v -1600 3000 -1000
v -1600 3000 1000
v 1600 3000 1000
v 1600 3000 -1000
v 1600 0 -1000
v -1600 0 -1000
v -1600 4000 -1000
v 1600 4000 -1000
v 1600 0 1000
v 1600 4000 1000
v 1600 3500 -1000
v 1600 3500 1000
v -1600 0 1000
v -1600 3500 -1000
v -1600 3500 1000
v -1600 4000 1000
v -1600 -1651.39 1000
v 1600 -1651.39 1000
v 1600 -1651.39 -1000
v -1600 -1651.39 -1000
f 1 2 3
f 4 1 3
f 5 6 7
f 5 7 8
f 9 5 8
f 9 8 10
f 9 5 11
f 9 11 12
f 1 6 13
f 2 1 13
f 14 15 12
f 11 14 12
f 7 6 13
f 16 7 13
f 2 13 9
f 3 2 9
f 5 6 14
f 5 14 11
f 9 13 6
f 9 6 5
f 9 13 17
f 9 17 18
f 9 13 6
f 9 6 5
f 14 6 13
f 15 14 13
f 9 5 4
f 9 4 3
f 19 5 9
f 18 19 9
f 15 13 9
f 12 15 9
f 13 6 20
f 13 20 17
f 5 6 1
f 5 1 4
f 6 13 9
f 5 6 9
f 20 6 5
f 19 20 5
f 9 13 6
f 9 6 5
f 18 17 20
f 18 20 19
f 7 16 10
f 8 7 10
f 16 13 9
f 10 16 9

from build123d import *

# Parameters (mm, degrees)
F0_W     = 3200
F0_H     = 2000
F1_DEPTH = 1651.39
F2_DEPTH = 3000
F3_DEPTH = 3500
F4_DEPTH = 4000


with BuildPart() as f1:
    # F0 (on Front) → F1 (new body)
    with BuildSketch(Plane.XZ):
        Rectangle(F0_W, F0_H)
    extrude(amount=F1_DEPTH)


with BuildPart() as f2:
    # F0 (on Front) → F2 (new body)
    with BuildSketch(Plane.XZ):
        Rectangle(F0_W, F0_H)
    extrude(amount=-F2_DEPTH)


with BuildPart() as f3:
    # F0 (on Front) → F3 (new body)
    with BuildSketch(Plane.XZ):
        Rectangle(F0_W, F0_H)
    extrude(amount=-F3_DEPTH)


with BuildPart() as f4:
    # F0 (on Front) → F4 (new body)
    with BuildSketch(Plane.XZ):
        Rectangle(F0_W, F0_H)
    extrude(amount=-F4_DEPTH)


solid = Compound([f1.part, f2.part, f3.part, f4.part])
